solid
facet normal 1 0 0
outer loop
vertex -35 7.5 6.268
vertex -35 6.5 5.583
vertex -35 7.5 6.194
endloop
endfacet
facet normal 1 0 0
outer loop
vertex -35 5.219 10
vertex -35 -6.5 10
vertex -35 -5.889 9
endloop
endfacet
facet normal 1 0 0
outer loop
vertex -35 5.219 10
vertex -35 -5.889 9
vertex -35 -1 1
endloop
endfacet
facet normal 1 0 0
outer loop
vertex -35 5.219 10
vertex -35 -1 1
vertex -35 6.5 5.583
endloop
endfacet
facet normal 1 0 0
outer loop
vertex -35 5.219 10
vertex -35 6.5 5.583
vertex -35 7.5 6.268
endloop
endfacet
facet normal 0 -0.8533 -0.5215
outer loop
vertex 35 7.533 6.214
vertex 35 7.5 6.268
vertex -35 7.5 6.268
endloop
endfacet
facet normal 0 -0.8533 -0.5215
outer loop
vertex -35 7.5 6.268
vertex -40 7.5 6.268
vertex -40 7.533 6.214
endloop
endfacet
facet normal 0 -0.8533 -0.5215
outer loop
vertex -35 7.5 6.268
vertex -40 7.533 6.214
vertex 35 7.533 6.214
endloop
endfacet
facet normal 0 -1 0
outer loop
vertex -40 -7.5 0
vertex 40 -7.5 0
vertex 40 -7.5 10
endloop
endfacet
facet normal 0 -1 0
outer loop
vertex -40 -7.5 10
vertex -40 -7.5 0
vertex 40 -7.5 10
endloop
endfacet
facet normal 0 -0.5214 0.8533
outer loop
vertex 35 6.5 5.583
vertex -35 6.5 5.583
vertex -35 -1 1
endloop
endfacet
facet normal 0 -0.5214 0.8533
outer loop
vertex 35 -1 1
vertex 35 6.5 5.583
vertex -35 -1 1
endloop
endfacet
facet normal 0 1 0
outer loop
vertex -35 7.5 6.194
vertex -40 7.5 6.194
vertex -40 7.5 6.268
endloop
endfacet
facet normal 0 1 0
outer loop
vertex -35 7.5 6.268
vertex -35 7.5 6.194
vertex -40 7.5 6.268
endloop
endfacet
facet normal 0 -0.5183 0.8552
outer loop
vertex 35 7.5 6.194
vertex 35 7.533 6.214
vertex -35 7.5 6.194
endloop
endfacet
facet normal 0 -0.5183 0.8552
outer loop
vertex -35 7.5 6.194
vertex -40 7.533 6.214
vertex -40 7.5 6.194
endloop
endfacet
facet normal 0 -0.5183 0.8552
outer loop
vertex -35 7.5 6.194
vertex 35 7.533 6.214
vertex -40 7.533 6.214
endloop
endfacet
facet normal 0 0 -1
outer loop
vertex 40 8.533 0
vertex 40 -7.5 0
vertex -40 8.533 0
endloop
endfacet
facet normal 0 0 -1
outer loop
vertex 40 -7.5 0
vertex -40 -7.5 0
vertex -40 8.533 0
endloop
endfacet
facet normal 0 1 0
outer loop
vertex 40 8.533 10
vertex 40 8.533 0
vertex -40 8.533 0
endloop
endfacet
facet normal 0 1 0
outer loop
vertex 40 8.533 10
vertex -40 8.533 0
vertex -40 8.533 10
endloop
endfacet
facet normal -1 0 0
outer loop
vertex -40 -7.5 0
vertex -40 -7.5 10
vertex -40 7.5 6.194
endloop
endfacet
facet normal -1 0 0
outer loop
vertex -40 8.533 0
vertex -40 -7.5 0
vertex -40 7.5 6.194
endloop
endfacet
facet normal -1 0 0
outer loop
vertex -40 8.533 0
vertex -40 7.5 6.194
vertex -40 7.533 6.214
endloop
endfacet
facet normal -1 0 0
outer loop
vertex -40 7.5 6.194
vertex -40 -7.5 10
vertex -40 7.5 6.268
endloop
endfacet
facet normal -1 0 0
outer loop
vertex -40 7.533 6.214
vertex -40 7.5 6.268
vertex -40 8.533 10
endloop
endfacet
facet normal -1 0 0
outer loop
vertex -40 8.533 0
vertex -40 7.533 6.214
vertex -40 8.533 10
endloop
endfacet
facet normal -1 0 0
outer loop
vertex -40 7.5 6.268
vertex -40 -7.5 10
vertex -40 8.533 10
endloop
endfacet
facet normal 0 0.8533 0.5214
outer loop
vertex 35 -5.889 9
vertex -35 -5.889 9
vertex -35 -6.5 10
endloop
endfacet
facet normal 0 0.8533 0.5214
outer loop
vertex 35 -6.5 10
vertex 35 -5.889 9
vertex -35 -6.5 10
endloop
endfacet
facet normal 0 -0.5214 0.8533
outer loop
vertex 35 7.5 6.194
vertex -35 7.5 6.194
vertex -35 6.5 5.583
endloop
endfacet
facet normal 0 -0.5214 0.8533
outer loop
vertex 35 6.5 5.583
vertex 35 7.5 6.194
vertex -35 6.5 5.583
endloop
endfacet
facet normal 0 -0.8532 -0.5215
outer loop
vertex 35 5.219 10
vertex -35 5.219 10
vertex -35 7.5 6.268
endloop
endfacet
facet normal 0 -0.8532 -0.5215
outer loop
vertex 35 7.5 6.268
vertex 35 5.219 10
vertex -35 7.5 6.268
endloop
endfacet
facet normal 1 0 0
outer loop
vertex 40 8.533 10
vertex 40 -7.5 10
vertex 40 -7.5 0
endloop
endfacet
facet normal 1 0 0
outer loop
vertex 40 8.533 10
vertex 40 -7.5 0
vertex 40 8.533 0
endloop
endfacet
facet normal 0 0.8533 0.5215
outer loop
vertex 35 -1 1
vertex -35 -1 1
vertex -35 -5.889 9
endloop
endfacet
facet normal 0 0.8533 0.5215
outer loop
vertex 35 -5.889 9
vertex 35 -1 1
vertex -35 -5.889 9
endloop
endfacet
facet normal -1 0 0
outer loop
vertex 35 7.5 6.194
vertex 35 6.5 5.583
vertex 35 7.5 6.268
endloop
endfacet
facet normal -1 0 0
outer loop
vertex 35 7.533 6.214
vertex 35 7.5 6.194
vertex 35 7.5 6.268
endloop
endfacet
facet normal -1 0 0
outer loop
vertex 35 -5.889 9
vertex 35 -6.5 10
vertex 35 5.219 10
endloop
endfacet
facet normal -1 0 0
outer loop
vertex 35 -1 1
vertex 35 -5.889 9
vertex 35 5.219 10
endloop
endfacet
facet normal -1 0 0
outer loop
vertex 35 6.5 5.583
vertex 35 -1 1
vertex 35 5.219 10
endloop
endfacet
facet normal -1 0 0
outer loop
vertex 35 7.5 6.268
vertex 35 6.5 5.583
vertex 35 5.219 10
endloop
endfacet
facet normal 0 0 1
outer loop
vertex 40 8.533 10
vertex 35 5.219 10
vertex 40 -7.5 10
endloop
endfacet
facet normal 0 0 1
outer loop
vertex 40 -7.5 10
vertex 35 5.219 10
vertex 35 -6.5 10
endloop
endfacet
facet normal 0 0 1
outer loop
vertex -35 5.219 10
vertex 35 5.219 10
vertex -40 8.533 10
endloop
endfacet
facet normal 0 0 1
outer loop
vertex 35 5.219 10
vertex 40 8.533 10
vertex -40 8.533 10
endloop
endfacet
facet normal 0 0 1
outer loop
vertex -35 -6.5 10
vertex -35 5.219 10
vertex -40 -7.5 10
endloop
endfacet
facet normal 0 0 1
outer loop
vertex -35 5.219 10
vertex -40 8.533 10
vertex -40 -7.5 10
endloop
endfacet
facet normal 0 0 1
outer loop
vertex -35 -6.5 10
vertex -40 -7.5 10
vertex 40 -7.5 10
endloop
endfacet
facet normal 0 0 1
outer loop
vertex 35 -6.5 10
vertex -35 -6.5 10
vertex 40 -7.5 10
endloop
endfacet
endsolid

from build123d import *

# Parameters (mm, degrees)
F1_DEPTH = 5
F3_DEPTH = 5
F4_DEPTH = 70
F5_W     = 16.032818
F5_H     = 10
F6_DEPTH = 5


with BuildPart() as f1:
    # F0 (on Right) → F1 (new body)
    with BuildSketch(Plane.YZ):
        Polygon((-7.5, 0), (0, 0), (7.5, 0), (7.5, 10), (-7.5, 10), align=None)
    extrude(amount=F1_DEPTH)

    # F2 (on face) → F3 (join)
    with BuildSketch(Plane.YZ.offset(5)):
        Polygon((7.532818, 6.2145), (8.532818, 6.2145), (8.532818, 10), (7.5, 10), (7.5, 6.268203), align=None)
        Polygon((7.5, 6.194444), (7.5, 0), (8.532818, 0), (8.532818, 6.2145), (7.532818, 6.2145), align=None)
    extrude(amount=-F3_DEPTH)

    # F2 (on face) → F4 (join)
    with BuildSketch(Plane.YZ.offset(5)):
        Polygon((-7.5, 0), (0, 0), (0, 1), (-1, 1), (-6.5, 1), (-6.5, 9), (-5.888889, 9), (-6.5, 10), (-7.5, 10), align=None)
        Polygon((-6.5, 1), (-1, 1), (-5.888889, 9), (-6.5, 9), align=None)
        Polygon((-1, 1), (0, 1), (6.5, 1), (6.5, 5.583333), align=None)
        Polygon((7.5, 6.194444), (7.5, 0), (8.532818, 0), (8.532818, 6.2145), (7.532818, 6.2145), align=None)
        Polygon((0, 1), (0, 0), (7.5, 0), (7.5, 6.194444), (6.5, 5.583333), (6.5, 1), align=None)
        Polygon((7.532818, 6.2145), (8.532818, 6.2145), (8.532818, 10), (7.5, 10), (7.5, 6.268203), align=None)
        Polygon((5.219457, 10), (7.5, 6.268203), (7.5, 10), align=None)
    extrude(amount=F4_DEPTH)

    # F5 (on face) → F6 (join)
    with BuildSketch(Plane.YZ.offset(75)):
        with Locations((0.516409, 5)):
            Rectangle(F5_W, F5_H)
        Polygon((-7.5, 10), (-7.5, 0), (8.532818, 0), (8.532818, 10), (-6.5, 10), align=None)
    extrude(amount=F6_DEPTH)


with BuildPart() as f1_1:
    # F7: moved
    add(f1.part.moved(Location((-40, 0, 0))))


solid = f1_1.part
